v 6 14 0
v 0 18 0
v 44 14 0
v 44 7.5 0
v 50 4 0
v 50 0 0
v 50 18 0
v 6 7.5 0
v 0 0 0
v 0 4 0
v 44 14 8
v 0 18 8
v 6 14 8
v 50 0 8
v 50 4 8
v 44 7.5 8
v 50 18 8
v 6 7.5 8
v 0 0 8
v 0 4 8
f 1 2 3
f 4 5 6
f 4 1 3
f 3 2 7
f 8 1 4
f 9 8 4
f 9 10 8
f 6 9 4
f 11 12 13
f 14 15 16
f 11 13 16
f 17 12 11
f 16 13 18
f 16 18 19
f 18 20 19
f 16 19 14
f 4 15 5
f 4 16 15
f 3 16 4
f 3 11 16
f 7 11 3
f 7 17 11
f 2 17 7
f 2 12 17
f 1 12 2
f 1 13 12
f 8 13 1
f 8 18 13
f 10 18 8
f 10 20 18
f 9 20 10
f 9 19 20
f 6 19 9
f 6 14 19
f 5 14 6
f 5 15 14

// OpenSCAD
$fn = 32;

// ----------------------------------------------------------------------
// Key bar: dovetail key, 8 mm thick
// ----------------------------------------------------------------------

// --- parameters (mm) ---
profile_height = 8;       // extrusion height
profile_points = 10;      // points of the closed outline

profile = [[0, 0], [50, 0], [50, 4], [44, 7.5], [44, 14], [50, 18], [0, 18], [6, 14], [6, 7.5], [0, 4]];  // single closed polygon, 10 points, counter clockwise

// --- the one profile operation ---
linear_extrude(height = profile_height) polygon(points = profile);
